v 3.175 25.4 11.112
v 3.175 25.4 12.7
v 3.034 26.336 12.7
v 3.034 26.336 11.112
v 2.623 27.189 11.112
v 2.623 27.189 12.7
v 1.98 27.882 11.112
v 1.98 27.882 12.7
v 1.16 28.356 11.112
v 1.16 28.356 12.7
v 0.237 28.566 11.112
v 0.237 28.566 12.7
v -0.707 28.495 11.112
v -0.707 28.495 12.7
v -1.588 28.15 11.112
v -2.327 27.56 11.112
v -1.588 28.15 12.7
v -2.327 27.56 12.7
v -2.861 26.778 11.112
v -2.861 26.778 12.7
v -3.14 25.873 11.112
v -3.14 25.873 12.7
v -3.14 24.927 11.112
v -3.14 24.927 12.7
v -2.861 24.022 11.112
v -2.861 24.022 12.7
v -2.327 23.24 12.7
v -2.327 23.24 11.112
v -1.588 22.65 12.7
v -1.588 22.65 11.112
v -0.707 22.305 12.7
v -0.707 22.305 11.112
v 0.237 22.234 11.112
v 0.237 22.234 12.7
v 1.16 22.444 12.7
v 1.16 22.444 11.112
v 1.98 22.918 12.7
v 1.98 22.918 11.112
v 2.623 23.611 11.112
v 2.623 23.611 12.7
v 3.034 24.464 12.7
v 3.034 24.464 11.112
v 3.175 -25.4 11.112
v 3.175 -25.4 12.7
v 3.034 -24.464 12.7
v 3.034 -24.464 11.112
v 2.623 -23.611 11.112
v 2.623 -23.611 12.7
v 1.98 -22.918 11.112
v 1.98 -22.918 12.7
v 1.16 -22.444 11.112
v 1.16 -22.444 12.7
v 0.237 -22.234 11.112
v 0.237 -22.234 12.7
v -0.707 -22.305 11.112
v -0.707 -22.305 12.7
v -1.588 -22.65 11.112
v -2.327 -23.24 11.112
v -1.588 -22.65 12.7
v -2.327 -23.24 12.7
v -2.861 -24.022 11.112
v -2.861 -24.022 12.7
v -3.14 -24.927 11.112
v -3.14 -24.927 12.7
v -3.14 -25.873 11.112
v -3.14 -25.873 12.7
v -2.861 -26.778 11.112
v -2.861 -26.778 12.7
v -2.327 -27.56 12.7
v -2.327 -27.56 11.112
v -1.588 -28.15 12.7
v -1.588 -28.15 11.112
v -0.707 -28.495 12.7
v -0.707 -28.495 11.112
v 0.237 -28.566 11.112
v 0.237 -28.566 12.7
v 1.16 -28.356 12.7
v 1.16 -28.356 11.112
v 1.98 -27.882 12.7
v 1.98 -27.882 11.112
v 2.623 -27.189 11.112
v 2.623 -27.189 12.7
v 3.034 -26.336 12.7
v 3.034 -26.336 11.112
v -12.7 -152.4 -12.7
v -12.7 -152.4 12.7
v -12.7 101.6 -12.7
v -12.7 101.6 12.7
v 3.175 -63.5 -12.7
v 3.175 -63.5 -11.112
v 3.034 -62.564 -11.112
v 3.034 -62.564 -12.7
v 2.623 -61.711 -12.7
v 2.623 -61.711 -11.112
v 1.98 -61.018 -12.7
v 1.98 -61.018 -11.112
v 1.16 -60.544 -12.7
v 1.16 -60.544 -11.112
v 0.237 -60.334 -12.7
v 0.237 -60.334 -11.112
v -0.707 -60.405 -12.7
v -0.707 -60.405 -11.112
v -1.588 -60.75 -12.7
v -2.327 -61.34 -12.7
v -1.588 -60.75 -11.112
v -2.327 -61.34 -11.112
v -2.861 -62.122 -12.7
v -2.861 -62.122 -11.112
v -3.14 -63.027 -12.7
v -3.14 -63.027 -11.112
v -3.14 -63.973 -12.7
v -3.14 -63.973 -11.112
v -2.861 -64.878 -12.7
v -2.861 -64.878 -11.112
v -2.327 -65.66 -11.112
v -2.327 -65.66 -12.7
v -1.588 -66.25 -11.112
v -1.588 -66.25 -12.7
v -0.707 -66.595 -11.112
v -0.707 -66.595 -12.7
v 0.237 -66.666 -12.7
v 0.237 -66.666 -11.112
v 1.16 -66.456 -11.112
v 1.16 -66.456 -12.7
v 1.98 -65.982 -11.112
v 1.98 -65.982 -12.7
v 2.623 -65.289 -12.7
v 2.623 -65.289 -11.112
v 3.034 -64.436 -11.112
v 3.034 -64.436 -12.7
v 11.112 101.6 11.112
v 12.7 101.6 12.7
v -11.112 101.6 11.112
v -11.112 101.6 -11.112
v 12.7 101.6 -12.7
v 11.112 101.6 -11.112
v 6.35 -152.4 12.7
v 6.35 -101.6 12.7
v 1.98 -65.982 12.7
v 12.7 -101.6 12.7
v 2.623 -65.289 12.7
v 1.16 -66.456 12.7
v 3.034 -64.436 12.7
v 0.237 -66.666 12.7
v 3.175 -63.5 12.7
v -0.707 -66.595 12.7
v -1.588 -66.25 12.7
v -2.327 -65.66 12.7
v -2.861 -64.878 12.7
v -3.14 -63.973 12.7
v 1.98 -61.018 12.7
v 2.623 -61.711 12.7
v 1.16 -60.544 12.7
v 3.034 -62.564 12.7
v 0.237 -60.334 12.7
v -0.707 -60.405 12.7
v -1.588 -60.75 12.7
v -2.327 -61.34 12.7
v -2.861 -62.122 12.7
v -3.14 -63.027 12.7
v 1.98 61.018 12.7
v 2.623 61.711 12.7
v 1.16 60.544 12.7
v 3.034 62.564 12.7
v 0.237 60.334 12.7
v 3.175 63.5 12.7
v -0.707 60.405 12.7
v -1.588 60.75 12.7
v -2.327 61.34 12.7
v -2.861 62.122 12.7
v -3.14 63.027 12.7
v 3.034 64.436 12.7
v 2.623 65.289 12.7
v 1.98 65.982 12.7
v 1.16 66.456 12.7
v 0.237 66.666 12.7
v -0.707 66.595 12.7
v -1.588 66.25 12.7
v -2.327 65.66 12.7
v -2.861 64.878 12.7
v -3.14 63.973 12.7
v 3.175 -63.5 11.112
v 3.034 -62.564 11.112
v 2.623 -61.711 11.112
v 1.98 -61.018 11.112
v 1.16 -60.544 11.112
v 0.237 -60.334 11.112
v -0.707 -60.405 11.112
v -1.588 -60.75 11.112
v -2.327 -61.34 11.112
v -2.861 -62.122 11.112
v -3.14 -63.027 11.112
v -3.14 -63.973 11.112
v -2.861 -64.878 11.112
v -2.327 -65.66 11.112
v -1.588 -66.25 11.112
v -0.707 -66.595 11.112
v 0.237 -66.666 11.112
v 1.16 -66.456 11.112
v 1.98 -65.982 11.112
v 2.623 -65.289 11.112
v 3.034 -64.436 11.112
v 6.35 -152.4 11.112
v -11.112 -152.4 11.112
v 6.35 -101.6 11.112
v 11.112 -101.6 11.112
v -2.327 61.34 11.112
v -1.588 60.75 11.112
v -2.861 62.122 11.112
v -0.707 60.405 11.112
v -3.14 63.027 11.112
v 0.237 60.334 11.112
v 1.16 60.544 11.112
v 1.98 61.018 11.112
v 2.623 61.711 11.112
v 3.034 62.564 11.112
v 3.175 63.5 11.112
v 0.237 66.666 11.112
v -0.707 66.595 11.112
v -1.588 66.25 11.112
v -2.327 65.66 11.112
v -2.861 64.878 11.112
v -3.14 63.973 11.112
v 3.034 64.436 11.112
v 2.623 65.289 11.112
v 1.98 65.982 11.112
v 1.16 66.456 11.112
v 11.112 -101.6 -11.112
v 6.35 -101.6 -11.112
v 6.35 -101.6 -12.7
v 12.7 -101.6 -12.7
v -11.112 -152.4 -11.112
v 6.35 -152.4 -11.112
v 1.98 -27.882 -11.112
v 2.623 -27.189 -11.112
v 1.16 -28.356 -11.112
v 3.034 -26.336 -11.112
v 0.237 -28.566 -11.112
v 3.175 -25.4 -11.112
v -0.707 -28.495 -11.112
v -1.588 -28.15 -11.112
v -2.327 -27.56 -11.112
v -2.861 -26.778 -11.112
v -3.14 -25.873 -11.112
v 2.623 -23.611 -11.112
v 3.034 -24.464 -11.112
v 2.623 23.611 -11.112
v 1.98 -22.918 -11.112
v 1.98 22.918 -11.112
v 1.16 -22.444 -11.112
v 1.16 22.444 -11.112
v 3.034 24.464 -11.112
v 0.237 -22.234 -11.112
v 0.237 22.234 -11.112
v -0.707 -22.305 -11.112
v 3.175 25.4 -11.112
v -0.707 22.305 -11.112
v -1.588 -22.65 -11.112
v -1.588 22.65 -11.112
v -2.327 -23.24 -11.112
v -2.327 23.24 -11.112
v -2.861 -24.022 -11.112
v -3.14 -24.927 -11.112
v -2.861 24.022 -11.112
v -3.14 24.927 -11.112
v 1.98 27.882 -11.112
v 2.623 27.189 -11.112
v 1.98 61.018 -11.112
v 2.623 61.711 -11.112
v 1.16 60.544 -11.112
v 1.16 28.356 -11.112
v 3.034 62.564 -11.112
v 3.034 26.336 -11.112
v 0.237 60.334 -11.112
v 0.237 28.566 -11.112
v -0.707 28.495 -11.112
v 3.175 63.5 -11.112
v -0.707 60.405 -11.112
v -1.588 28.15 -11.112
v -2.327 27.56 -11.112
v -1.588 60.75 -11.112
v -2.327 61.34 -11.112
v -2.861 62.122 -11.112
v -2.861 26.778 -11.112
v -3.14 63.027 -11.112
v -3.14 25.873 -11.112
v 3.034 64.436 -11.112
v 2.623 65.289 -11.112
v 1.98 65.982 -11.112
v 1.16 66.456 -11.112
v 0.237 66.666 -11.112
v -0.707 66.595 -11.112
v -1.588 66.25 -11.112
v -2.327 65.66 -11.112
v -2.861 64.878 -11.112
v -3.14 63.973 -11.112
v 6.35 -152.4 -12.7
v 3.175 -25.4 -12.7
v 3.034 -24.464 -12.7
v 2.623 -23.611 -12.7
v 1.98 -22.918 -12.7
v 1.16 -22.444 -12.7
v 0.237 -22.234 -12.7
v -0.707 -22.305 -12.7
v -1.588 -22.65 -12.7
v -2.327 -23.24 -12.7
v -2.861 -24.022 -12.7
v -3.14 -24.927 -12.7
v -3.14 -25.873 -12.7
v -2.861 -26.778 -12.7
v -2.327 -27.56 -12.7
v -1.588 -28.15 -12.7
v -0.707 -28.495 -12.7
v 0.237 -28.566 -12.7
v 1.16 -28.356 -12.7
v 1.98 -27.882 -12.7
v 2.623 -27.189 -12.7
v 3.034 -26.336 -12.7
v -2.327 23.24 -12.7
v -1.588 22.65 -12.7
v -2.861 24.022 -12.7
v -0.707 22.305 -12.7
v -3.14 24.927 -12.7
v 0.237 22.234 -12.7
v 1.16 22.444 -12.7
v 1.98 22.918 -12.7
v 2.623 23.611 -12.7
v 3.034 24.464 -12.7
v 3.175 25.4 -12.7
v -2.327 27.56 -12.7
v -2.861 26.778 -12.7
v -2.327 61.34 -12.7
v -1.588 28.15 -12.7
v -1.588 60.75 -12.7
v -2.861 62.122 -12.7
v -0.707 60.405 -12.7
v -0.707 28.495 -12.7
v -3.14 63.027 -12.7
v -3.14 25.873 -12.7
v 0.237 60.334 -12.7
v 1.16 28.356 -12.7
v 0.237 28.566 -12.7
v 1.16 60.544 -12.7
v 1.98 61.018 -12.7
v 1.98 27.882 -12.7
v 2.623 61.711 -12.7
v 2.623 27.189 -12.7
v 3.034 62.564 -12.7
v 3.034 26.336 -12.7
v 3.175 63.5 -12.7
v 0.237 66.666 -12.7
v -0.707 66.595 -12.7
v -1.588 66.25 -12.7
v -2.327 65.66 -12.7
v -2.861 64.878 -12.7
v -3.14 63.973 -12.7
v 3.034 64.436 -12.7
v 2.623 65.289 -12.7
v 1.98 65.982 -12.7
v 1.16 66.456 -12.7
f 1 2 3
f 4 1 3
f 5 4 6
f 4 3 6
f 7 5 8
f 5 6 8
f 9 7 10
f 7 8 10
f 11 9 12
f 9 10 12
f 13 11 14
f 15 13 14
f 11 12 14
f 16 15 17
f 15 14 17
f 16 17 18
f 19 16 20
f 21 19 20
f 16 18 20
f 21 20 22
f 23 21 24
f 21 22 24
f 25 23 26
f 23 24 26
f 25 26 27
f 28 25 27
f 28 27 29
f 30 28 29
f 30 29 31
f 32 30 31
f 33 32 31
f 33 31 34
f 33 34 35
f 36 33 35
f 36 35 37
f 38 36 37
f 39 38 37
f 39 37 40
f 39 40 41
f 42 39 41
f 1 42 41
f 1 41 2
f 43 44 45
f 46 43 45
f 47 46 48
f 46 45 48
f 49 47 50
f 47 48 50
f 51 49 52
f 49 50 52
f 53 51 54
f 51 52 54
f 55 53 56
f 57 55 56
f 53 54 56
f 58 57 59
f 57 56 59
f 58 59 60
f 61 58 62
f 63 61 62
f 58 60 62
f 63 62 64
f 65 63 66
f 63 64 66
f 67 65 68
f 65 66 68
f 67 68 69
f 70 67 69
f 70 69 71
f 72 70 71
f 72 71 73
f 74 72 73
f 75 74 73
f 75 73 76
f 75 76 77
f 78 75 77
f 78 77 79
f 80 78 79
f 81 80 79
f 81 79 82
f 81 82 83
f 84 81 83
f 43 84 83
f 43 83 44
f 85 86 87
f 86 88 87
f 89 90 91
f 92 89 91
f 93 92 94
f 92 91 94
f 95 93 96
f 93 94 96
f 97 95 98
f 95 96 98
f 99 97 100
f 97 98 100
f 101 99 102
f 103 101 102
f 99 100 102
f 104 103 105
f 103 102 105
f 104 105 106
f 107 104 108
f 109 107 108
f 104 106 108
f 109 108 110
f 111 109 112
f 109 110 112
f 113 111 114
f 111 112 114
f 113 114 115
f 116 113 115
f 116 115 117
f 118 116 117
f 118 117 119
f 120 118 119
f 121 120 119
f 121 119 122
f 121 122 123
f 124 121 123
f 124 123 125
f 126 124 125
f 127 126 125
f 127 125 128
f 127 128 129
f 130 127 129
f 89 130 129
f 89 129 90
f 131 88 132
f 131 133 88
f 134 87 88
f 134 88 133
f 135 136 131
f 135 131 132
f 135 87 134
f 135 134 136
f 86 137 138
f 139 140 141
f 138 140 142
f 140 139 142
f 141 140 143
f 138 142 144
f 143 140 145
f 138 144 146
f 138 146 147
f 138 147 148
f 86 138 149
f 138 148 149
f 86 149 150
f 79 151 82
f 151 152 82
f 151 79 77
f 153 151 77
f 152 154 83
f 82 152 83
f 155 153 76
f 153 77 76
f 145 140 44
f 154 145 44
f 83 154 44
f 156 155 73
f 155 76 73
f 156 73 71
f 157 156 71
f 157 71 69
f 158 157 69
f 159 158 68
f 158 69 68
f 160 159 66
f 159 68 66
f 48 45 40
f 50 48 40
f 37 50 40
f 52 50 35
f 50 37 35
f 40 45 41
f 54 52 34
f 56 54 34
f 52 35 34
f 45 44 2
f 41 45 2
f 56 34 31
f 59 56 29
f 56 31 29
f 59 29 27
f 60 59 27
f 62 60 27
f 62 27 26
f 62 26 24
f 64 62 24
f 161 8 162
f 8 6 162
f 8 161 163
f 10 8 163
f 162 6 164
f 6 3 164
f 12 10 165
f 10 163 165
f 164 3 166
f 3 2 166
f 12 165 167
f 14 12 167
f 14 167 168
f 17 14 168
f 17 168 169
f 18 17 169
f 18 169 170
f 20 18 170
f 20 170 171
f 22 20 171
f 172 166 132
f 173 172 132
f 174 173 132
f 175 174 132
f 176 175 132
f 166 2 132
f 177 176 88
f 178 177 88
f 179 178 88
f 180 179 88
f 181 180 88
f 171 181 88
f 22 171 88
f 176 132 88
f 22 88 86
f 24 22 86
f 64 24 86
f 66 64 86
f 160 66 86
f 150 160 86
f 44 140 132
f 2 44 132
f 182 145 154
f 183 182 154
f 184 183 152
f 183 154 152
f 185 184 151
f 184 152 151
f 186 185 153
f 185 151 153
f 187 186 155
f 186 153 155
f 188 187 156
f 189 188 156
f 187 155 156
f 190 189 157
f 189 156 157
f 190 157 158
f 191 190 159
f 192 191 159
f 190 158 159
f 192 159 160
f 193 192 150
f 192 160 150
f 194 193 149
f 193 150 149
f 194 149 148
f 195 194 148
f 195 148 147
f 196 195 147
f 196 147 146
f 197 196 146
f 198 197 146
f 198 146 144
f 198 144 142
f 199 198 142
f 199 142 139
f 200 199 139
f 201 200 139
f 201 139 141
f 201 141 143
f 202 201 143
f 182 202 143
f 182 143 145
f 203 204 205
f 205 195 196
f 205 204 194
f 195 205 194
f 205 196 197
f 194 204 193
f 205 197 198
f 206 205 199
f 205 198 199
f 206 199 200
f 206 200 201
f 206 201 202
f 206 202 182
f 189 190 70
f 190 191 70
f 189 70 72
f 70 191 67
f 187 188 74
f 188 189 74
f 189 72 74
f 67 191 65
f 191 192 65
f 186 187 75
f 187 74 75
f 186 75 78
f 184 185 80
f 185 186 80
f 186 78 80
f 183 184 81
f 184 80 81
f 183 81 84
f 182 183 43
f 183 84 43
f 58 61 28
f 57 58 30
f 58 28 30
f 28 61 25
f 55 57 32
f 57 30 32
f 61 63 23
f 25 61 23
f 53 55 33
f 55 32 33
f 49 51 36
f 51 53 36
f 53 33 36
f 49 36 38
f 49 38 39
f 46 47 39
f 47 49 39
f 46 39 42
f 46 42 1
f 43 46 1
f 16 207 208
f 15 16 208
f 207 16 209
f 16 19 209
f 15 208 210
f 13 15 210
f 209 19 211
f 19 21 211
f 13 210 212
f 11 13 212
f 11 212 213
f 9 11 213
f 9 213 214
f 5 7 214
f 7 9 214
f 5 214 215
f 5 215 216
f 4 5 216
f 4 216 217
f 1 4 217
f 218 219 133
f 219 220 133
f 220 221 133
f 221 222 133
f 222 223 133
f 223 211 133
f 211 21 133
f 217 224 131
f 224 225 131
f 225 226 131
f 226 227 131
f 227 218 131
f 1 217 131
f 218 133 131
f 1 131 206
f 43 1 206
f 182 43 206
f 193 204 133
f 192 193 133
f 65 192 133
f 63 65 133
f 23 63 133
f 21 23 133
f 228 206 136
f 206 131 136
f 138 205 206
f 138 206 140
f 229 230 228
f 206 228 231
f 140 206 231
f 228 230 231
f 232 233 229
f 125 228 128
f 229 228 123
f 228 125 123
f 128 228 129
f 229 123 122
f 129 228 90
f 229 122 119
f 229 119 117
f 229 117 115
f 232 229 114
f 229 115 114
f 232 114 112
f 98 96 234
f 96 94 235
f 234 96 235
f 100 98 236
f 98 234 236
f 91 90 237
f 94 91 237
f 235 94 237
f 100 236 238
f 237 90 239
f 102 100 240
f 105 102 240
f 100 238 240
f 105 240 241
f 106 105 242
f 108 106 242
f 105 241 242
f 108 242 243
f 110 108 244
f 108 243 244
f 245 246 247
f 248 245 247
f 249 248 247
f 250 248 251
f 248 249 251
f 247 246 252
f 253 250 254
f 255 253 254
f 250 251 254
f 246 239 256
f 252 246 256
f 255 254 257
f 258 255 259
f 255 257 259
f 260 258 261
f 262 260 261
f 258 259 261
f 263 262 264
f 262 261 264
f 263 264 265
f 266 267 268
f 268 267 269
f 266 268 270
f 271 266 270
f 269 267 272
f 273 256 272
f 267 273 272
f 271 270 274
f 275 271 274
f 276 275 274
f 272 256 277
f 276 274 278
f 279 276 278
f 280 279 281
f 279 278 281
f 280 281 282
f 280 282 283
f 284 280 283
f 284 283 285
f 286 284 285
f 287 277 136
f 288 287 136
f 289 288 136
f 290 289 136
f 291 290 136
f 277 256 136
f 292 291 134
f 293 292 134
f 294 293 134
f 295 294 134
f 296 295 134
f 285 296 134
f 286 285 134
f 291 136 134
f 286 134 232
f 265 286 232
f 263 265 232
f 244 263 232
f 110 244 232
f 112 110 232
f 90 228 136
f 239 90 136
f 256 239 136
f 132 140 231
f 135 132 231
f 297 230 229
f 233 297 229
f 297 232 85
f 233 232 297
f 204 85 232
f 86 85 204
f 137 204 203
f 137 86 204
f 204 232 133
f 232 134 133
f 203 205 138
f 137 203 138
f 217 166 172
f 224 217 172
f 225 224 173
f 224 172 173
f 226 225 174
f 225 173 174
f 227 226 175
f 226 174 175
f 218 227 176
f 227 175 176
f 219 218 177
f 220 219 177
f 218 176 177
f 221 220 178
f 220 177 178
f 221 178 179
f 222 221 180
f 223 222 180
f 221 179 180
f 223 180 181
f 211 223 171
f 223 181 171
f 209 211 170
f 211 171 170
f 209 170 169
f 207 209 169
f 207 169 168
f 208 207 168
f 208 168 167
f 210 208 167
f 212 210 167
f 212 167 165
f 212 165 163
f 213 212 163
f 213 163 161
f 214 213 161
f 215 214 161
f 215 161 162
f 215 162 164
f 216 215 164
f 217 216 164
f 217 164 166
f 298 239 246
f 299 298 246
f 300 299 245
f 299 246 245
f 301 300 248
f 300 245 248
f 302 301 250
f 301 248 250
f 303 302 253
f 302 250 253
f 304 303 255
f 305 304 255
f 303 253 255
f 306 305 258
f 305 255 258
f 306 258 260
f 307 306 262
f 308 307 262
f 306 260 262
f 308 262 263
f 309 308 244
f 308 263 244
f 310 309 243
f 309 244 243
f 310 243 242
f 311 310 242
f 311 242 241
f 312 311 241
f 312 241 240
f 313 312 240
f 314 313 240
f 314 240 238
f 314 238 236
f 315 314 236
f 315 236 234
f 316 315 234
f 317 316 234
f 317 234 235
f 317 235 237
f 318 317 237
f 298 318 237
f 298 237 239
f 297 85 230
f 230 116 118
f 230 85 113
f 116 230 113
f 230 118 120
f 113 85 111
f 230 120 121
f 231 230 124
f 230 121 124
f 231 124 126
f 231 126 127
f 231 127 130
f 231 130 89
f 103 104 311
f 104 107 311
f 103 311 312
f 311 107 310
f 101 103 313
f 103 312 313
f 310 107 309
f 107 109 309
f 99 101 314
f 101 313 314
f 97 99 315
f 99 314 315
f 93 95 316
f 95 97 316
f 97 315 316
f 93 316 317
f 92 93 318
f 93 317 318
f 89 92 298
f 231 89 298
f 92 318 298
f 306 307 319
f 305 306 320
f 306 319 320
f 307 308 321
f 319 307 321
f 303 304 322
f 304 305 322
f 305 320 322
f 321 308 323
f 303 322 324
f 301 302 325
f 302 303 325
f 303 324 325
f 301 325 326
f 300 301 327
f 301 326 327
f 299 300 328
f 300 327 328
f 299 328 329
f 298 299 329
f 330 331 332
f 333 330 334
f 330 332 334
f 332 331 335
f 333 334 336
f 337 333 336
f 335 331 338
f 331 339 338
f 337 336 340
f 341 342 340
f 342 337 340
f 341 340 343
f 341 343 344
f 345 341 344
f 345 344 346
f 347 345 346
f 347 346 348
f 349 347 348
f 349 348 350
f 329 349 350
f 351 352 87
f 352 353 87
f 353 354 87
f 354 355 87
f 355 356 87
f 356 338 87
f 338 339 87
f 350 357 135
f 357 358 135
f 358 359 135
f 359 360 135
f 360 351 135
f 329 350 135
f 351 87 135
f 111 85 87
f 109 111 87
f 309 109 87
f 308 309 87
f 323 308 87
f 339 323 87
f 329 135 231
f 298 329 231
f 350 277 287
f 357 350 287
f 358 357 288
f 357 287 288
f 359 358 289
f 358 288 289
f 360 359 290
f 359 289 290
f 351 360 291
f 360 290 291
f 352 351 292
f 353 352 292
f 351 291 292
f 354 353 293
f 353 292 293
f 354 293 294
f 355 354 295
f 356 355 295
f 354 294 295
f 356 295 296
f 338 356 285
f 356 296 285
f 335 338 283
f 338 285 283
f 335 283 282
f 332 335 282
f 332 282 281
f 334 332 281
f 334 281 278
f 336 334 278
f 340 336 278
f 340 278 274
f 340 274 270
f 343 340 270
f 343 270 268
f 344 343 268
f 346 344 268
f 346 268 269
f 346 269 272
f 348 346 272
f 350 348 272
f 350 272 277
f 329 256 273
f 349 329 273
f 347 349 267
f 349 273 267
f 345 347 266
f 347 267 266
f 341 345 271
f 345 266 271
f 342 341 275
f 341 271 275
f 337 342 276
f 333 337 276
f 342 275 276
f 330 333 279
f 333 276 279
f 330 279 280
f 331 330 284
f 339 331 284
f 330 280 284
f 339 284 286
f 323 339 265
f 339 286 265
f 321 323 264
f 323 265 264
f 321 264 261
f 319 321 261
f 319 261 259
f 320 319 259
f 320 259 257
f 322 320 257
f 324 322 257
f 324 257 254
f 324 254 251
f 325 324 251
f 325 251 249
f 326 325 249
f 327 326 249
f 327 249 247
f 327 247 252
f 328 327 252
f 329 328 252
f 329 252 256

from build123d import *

# Parameters (mm, degrees)
SKETCH1_W           = 25.4
SKETCH1_H           = 25.4
SKETCH1_W_2         = 22.225
SKETCH1_H_2         = 22.225
BOSS_EXTRUDE1_DEPTH = 101.6
SKETCH4_R           = 3.175
CUT_EXTRUDE3_DEPTH  = 25.4
SKETCH5_R           = 3.175
CUT_EXTRUDE4_DEPTH  = 25.4
BOSS_EXTRUDE2_DEPTH = 50.8


with BuildPart() as part:
    # Sketch1 → Boss-Extrude1 (new, symmetric)
    with BuildSketch(Plane(origin=(0, 0, 0), x_dir=(1, 0, 0), z_dir=(0, 1, 0))):
        Rectangle(SKETCH1_W, SKETCH1_H)
        Rectangle(SKETCH1_W_2, SKETCH1_H_2, mode=Mode.SUBTRACT)
    extrude(amount=BOSS_EXTRUDE1_DEPTH, both=True)

    # Sketch4 → Cut-Extrude3 (cut)
    with BuildSketch(Plane.XY.offset(12.7)):
        with Locations((0, 63.5)):
            Circle(SKETCH4_R)
        with Locations((0, -63.5)):
            Circle(SKETCH4_R)
    extrude(amount=-CUT_EXTRUDE3_DEPTH, mode=Mode.SUBTRACT)

    # Sketch5 → Cut-Extrude4 (cut)
    with BuildSketch(Plane.XY.offset(12.7)):
        with Locations((0, 25.4)):
            Circle(SKETCH5_R)
        with Locations((0, -25.4)):
            Circle(SKETCH5_R)
    extrude(amount=-CUT_EXTRUDE4_DEPTH, mode=Mode.SUBTRACT)

    # Sketch6 → Boss-Extrude2 (add)
    with BuildSketch(Plane.XZ.offset(101.6)):
        Polygon((6.35, -11.1125), (-11.1125, -11.1125), (-11.1125, 11.1125), (6.35, 11.1125), (6.35, 12.7), (-12.7, 12.7), (-12.7, -12.7), (6.35, -12.7), align=None)
    extrude(amount=BOSS_EXTRUDE2_DEPTH)


solid = part.part
